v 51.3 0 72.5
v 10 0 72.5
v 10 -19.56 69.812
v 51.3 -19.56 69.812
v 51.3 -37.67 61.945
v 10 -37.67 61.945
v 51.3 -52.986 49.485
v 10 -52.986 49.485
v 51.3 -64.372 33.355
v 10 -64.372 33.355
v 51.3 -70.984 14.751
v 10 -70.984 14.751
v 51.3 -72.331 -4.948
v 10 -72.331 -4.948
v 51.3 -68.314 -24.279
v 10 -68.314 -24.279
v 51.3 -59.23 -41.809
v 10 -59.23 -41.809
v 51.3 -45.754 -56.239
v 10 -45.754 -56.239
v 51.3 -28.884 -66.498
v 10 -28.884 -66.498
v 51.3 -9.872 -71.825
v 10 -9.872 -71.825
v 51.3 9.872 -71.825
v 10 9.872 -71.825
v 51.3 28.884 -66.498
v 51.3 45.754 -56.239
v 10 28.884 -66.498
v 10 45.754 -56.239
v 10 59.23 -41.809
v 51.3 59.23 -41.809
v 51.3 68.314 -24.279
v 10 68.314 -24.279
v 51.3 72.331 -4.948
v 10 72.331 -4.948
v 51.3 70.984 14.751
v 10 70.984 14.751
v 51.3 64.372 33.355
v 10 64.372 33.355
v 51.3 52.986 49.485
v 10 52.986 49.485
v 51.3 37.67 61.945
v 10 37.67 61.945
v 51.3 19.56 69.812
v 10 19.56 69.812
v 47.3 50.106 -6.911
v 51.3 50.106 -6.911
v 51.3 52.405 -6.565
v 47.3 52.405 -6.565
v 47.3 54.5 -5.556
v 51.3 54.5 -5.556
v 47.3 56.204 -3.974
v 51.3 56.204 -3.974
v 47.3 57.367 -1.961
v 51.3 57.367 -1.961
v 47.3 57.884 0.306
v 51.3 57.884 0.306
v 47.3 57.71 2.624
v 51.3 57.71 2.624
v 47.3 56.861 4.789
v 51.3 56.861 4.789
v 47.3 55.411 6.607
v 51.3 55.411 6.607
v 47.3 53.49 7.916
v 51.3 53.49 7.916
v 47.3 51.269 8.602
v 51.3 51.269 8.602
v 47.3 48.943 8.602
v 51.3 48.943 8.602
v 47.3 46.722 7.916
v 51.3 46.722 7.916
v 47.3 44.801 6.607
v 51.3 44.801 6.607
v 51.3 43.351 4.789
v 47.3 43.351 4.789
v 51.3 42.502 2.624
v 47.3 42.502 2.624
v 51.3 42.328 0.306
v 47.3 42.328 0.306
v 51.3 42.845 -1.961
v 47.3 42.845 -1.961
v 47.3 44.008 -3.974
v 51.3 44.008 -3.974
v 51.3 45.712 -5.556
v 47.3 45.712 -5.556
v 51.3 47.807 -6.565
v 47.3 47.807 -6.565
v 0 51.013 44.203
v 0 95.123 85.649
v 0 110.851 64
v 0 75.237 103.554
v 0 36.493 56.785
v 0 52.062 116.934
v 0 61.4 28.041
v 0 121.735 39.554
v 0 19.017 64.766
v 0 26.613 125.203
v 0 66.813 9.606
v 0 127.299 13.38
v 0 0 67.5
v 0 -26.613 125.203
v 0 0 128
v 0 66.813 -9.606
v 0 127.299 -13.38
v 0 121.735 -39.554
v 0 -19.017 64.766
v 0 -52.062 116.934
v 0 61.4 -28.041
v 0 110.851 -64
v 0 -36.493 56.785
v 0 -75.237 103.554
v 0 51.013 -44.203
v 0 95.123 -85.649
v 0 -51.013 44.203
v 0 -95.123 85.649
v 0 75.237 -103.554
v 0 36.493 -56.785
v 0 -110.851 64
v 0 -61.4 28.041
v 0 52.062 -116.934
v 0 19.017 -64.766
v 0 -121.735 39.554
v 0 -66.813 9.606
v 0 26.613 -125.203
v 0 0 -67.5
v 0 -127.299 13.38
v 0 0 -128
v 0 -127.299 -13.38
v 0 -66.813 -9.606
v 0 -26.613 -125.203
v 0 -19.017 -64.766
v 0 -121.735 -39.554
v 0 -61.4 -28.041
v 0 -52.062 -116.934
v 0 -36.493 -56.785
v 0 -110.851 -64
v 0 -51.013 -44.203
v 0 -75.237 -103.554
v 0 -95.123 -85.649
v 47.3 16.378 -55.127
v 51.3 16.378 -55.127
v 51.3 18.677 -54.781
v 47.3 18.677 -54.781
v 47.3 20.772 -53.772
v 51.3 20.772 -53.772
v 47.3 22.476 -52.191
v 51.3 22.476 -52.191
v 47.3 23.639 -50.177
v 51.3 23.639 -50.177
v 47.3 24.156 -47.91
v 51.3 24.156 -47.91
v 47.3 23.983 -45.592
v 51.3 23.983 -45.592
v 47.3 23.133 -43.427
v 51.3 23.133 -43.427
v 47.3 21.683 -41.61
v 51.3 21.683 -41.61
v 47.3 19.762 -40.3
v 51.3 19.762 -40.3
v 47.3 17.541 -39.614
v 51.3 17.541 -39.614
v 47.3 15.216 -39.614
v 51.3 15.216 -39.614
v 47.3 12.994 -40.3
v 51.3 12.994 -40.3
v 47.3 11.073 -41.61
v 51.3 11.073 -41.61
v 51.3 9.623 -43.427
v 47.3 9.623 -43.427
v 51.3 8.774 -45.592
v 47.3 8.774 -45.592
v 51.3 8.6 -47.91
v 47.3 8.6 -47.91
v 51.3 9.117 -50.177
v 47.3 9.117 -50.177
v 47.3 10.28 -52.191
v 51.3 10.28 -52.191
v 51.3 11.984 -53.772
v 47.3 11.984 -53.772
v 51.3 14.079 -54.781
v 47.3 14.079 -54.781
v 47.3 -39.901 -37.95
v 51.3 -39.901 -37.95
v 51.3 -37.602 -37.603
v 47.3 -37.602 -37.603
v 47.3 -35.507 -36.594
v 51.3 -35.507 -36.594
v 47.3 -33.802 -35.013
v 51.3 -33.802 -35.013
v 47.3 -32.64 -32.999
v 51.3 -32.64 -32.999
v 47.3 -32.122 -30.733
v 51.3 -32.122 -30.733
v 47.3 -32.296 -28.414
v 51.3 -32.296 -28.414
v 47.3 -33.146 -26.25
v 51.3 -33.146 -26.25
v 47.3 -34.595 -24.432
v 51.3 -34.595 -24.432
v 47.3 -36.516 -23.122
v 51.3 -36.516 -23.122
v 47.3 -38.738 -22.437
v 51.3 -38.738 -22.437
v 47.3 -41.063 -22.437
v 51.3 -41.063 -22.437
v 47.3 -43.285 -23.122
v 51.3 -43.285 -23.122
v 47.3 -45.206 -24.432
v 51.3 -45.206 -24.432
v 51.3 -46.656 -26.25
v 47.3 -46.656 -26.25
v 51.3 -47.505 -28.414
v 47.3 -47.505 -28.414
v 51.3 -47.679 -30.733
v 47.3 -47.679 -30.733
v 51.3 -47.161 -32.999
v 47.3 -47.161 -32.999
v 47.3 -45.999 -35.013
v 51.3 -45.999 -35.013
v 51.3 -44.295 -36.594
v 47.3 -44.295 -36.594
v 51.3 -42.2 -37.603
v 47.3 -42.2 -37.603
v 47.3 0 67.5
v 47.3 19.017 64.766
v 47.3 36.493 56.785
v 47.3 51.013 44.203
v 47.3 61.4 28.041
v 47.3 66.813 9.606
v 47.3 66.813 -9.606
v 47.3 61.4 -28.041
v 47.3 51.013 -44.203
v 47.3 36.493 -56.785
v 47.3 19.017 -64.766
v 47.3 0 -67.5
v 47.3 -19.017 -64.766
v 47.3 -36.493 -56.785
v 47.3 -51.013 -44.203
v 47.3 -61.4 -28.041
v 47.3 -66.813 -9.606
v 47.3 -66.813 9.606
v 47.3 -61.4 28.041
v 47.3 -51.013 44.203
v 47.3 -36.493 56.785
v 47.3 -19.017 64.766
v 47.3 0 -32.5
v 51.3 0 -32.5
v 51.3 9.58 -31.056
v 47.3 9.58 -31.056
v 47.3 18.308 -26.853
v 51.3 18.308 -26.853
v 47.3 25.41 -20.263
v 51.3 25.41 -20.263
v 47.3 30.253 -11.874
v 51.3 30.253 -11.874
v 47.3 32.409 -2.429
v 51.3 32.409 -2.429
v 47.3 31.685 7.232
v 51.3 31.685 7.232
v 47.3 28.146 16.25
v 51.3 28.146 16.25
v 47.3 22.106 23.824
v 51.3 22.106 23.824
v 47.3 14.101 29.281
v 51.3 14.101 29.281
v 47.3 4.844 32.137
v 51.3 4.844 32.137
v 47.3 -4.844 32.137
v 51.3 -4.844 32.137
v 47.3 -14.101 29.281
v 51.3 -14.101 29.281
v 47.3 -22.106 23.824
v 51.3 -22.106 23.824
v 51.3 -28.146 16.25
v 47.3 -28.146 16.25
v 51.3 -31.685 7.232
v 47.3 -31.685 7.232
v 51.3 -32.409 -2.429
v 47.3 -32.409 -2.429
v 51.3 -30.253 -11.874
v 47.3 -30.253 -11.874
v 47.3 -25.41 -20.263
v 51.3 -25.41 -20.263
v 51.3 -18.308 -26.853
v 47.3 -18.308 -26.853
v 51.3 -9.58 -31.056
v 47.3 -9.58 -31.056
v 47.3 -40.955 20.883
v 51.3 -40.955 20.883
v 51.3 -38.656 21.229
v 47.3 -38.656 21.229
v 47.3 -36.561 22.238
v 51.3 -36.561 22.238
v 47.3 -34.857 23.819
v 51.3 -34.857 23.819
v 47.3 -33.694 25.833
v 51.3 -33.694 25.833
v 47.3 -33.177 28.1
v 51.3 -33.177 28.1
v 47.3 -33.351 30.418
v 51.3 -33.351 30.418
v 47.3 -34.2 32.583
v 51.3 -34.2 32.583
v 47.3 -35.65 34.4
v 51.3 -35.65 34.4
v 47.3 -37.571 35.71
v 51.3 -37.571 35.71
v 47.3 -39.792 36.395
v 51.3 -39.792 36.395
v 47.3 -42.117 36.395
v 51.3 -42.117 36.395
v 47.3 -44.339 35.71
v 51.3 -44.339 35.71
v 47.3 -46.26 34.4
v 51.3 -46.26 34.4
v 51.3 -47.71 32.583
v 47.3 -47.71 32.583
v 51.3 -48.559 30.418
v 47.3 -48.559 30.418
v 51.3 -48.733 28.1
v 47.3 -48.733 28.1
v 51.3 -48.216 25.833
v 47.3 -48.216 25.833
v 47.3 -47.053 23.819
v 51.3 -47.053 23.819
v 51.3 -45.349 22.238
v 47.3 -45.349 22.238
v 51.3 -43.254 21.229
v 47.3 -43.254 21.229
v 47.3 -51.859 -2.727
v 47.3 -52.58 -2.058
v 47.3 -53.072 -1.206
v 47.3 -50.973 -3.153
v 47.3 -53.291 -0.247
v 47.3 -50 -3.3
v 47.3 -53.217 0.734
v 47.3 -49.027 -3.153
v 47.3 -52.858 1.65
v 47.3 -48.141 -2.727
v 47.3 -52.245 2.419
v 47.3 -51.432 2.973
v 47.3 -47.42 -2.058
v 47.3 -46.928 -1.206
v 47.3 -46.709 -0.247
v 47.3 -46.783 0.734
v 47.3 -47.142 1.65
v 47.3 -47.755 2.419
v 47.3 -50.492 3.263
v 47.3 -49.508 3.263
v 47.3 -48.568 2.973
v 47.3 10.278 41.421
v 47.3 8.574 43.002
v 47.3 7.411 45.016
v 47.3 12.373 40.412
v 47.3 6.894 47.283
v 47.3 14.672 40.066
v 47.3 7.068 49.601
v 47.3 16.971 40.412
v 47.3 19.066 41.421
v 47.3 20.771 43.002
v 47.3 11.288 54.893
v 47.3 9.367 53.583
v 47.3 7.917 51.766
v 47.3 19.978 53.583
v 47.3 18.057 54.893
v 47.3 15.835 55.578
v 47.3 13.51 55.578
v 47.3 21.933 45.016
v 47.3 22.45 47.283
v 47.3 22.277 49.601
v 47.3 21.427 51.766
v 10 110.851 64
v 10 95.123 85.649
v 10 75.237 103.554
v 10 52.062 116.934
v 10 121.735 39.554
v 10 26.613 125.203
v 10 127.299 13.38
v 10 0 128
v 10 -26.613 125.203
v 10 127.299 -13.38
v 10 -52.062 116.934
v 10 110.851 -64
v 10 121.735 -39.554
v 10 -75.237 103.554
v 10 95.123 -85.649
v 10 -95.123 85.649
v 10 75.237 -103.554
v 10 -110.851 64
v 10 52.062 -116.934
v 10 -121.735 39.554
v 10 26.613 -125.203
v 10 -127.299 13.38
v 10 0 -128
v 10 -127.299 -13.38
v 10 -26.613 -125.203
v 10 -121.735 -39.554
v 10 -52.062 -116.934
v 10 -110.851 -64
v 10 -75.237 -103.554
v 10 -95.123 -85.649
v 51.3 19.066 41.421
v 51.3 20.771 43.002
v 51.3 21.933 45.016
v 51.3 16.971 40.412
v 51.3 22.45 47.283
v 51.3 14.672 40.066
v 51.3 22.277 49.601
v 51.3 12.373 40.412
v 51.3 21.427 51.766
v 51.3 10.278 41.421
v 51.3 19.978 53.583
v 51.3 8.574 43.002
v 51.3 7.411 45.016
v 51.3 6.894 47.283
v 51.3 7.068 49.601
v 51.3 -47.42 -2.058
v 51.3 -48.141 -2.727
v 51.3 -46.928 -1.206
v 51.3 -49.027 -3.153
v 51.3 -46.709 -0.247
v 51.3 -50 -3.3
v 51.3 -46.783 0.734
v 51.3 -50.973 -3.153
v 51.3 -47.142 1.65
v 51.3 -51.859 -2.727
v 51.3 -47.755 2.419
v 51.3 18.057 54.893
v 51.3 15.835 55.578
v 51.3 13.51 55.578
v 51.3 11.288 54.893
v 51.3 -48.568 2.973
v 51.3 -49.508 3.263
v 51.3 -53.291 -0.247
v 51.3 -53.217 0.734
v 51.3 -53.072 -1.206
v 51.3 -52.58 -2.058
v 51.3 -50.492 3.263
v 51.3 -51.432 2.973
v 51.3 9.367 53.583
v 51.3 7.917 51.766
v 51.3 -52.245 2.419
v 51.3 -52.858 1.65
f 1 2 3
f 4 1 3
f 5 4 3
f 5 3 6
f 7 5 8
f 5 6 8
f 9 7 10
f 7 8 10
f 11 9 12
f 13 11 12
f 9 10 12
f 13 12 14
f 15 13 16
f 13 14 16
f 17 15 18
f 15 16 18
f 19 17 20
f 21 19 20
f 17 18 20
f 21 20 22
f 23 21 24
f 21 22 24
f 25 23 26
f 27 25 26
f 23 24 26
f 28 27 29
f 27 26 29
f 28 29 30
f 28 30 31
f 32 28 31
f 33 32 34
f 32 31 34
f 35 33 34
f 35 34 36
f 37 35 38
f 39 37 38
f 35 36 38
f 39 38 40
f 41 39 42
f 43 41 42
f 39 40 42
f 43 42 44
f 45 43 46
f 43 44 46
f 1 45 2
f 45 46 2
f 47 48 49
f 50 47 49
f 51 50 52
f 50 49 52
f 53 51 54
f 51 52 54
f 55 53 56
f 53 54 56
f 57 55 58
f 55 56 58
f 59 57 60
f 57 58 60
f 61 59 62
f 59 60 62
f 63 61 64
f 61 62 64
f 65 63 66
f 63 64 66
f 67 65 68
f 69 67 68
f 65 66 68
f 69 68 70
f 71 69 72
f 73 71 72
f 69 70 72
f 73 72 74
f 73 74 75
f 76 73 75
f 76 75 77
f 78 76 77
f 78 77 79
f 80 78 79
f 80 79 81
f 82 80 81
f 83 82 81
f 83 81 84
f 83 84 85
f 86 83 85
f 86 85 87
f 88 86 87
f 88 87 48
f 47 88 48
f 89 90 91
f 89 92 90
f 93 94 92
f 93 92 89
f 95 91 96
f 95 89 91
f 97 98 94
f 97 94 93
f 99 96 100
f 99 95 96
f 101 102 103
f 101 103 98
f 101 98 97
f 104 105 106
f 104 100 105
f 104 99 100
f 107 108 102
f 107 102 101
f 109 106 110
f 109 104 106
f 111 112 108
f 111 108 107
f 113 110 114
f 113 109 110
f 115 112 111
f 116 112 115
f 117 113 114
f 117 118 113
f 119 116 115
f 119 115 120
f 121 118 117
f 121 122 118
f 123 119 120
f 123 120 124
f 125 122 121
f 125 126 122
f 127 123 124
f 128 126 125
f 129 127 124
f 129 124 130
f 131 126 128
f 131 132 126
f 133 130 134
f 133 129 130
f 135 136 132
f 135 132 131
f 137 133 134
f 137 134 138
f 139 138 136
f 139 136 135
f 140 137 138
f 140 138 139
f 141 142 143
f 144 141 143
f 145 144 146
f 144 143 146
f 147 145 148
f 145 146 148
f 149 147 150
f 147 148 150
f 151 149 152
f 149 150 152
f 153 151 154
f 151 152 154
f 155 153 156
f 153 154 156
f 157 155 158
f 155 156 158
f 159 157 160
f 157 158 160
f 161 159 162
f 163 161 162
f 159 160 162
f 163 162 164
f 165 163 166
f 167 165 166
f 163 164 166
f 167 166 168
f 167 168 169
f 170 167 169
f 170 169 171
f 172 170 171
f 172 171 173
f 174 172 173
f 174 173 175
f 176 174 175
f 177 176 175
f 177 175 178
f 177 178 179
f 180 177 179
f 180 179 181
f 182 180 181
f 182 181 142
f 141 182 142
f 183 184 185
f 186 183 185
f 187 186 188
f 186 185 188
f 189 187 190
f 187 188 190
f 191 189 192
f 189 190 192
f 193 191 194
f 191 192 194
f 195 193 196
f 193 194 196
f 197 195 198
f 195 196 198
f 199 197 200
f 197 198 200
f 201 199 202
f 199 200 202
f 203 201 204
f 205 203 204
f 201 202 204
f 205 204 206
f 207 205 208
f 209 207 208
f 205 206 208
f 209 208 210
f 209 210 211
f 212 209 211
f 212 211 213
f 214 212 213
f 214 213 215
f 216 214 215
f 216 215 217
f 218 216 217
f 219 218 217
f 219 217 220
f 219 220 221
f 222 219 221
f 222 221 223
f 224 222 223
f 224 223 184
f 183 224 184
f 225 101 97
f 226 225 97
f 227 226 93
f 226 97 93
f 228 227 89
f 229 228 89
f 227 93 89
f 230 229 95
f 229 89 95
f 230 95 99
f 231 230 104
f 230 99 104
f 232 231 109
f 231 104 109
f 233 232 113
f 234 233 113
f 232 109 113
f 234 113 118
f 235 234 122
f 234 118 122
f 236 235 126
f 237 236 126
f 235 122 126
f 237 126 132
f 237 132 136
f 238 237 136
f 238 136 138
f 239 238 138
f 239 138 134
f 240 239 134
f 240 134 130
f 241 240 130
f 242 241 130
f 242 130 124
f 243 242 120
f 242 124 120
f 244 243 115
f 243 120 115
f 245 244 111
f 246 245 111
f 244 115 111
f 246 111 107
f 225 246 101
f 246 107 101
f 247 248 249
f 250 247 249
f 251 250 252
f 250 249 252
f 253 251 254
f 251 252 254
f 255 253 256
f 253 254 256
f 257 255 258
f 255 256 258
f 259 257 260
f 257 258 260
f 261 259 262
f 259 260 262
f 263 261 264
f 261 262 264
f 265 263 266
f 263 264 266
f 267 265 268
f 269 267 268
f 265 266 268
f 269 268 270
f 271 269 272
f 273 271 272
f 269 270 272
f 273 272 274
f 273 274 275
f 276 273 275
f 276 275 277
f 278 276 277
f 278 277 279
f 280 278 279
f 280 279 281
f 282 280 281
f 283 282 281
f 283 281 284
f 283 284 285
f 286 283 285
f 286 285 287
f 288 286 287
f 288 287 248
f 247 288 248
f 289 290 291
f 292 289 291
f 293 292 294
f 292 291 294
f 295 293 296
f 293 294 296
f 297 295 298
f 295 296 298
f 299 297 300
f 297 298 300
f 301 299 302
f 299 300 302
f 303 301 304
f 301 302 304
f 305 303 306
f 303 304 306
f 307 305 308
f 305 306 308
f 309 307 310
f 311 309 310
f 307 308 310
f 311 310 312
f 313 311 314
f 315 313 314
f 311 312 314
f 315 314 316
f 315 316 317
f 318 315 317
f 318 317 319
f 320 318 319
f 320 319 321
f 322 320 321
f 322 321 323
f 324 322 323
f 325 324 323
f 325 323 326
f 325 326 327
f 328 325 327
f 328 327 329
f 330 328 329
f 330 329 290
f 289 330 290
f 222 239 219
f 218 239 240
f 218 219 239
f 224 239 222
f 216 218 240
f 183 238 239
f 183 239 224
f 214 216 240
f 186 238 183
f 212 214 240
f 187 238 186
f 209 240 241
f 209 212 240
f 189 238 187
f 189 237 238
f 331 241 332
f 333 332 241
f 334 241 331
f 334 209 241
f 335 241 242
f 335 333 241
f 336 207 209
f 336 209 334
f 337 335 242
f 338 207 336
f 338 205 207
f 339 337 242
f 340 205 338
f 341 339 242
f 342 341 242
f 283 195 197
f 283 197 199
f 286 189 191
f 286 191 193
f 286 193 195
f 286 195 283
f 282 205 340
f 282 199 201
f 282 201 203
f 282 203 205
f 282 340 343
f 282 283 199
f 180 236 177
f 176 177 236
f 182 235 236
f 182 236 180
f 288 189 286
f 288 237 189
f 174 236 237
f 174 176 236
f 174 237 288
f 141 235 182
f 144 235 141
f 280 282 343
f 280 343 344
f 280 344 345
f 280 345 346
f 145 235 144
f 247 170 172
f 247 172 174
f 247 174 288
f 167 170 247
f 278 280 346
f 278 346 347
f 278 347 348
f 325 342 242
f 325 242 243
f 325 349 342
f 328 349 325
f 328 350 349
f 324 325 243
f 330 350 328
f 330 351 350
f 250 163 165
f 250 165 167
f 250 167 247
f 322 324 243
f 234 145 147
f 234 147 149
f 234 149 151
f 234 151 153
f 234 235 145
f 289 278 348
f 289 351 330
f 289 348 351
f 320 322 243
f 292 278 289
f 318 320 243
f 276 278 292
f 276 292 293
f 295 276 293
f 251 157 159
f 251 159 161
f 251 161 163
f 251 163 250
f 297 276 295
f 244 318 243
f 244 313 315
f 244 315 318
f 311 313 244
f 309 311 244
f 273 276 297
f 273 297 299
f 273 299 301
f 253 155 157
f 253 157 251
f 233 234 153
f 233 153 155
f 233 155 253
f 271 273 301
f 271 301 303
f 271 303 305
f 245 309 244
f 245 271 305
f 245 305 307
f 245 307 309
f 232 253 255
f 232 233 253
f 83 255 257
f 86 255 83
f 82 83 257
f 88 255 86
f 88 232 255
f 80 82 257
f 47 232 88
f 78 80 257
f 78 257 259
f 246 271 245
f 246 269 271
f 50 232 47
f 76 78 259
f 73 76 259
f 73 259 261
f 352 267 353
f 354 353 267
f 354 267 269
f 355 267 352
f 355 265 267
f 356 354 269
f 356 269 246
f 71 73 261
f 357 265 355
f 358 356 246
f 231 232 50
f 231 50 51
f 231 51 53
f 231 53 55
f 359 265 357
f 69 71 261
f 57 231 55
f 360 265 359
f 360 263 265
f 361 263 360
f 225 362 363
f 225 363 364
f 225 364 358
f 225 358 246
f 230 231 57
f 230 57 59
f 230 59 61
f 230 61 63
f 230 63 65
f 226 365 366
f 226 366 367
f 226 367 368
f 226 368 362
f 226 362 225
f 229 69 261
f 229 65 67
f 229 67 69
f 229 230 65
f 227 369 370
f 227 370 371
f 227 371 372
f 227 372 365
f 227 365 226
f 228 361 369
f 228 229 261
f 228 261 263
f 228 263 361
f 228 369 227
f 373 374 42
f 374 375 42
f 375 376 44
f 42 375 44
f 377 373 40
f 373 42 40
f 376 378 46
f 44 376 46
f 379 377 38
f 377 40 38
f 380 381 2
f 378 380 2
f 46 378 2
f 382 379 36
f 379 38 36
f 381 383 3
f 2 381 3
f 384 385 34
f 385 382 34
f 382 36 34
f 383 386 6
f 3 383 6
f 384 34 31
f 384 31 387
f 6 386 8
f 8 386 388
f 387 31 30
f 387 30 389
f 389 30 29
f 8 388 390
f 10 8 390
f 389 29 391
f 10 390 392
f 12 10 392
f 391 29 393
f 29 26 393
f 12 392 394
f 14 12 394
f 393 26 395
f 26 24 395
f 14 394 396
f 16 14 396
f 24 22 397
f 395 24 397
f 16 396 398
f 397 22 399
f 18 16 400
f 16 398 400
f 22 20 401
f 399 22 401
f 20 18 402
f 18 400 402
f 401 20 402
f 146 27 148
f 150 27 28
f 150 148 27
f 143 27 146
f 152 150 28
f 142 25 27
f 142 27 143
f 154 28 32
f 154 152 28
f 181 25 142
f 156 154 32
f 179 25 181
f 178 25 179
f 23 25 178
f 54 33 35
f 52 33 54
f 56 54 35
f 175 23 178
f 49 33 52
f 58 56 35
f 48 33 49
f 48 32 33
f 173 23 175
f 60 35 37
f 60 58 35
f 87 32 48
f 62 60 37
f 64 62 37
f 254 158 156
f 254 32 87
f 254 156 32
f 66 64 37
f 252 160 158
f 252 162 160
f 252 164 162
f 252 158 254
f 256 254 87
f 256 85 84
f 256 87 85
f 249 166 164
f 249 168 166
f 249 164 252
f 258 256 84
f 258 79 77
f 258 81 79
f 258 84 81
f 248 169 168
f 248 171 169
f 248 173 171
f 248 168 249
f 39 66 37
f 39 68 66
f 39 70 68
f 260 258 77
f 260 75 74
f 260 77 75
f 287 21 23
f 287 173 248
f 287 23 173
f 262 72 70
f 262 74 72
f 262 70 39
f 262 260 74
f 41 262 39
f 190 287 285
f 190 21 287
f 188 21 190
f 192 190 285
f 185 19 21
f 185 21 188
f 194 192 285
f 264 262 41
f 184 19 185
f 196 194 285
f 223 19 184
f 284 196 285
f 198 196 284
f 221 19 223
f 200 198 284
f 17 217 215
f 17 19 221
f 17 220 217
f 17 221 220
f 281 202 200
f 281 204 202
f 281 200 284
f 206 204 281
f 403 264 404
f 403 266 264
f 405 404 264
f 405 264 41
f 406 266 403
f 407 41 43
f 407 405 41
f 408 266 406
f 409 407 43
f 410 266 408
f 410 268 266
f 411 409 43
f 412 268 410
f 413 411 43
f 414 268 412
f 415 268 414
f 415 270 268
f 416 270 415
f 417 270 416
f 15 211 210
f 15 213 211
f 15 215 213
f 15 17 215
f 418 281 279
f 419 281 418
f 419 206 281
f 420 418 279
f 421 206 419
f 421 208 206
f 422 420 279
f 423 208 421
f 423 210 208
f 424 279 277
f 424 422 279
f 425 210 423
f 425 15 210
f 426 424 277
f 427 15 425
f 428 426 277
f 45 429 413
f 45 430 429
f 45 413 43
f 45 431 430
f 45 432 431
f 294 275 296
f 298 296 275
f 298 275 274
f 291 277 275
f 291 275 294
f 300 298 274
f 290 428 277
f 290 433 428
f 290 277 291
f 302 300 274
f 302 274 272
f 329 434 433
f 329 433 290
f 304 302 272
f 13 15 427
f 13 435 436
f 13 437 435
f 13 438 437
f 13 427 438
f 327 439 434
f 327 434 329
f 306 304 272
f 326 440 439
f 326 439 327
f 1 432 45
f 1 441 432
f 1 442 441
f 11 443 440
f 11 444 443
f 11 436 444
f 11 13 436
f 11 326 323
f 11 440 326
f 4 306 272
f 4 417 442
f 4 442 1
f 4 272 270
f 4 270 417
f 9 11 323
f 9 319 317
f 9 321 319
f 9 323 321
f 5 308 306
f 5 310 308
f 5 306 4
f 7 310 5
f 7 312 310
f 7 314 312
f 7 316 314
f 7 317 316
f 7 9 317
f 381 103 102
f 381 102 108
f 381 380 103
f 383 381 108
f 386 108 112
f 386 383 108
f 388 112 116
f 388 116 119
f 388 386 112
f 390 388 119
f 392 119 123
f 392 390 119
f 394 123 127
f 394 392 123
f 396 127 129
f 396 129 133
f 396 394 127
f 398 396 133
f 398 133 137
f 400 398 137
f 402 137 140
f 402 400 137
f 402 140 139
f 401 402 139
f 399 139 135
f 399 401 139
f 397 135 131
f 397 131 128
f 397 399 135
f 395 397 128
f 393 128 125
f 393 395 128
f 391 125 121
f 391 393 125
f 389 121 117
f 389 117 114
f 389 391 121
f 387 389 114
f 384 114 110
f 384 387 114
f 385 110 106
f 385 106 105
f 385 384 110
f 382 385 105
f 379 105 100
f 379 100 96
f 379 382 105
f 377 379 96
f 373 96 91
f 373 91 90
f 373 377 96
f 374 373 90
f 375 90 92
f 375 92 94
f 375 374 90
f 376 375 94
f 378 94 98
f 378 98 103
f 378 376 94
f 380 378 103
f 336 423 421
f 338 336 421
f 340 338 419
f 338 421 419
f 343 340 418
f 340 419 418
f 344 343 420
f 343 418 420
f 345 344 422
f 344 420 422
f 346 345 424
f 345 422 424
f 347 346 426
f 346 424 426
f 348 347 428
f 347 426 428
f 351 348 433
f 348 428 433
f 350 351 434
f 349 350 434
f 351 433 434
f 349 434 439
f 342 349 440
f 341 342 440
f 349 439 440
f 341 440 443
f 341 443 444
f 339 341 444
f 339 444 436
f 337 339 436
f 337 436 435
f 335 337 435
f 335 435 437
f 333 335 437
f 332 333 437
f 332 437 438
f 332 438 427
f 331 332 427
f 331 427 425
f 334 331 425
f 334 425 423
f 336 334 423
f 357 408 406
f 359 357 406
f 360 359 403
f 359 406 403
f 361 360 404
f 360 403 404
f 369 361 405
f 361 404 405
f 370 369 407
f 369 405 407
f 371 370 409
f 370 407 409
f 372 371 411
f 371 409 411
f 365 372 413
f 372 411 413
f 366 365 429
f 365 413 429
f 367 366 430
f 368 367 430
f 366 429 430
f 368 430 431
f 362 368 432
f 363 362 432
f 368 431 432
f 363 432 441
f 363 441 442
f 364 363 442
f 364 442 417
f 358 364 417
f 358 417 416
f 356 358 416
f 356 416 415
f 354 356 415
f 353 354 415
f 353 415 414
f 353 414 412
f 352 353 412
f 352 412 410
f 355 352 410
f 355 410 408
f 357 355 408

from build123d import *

# Parameters (mm, degrees)
SZKIC1_W                    = 10
SZKIC1_H                    = 128
SZKIC7_R                    = 72.5
DODANIE_WYCI_GNI_CIE1_DEPTH = 41.3
SZKIC8_R                    = 67.5
WYTNIJ_WYCI_GNI_CIE7_DEPTH  = 47.3
WYTNIJ_WYCI_GNI_CIE8_REACH  = 190.148
SZKIC9_R                    = 32.5
WYTNIJ_WYCI_GNI_CIE9_REACH  = 190.148
SZKIC10_R                   = 3.3
SZKIC10_R_2                 = 7.8


with BuildPart() as part:
    # Szkic1 → Obrót1 (revolve)
    with BuildSketch(Plane(origin=(0, 0, 0), x_dir=(1, 0, 0), z_dir=(0, 1, 0)), mode=Mode.PRIVATE) as obr_t1_sk:
        with Locations((5, 64)):
            Rectangle(SZKIC1_W, SZKIC1_H)
    revolve(obr_t1_sk.sketch.rotate(Axis((0, 0, 0), (1, 0, 0)), 180), axis=Axis((0, 0, 0), (1, 0, 0)))

    # Szkic7 → Dodanie-wyciągnięcie1 (add)
    with BuildSketch(Plane(origin=(10, 0, 0), x_dir=(0, 0, -1), z_dir=(1, 0, 0))):
        with Locations(Location((0, 0, 0), (0, 0, 180))):
            Circle(SZKIC7_R)
    extrude(amount=DODANIE_WYCI_GNI_CIE1_DEPTH)

    # Szkic8 → Wytnij-wyciągnięcie7 (cut)
    with BuildSketch(Plane.ZY):
        Circle(SZKIC8_R)
    extrude(amount=-WYTNIJ_WYCI_GNI_CIE7_DEPTH, mode=Mode.SUBTRACT)

    # Szkic9 → Wytnij-wyciągnięcie8 (cut, up to next)
    with BuildSketch(Plane(origin=(51.3, 0, 0), x_dir=(0, 0, -1), z_dir=(1, 0, 0)), mode=Mode.PRIVATE) as wytnij_wyci_gni_cie8_sk1:
        Circle(SZKIC9_R)
    wytnij_wyci_gni_cie8_tool1 = extrude(wytnij_wyci_gni_cie8_sk1.sketch, amount=-WYTNIJ_WYCI_GNI_CIE8_REACH, mode=Mode.PRIVATE) & part.part
    add(wytnij_wyci_gni_cie8_tool1.solids().sort_by_distance((51.3, 0, 0))[0], mode=Mode.SUBTRACT)

    # Szkic10 → Wytnij-wyciągnięcie9 (cut, up to next)
    with BuildSketch(Plane(origin=(51.3, 0, 0), x_dir=(0, 0, -1), z_dir=(1, 0, 0)), mode=Mode.PRIVATE) as wytnij_wyci_gni_cie9_sk1:
        with Locations((0, -50)):
            Circle(SZKIC10_R)
    wytnij_wyci_gni_cie9_tool1 = extrude(wytnij_wyci_gni_cie9_sk1.sketch, amount=-WYTNIJ_WYCI_GNI_CIE9_REACH, mode=Mode.PRIVATE) & part.part
    # Szkic10 → Wytnij-wyciągnięcie9 (cut, up to next)
    with BuildSketch(Plane(origin=(51.3, 0, 0), x_dir=(0, 0, -1), z_dir=(1, 0, 0)), mode=Mode.PRIVATE) as wytnij_wyci_gni_cie9_sk2:
        with Locations((-28.682618124, -40.95494375)):
            Circle(SZKIC10_R_2)
    wytnij_wyci_gni_cie9_tool2 = extrude(wytnij_wyci_gni_cie9_sk2.sketch, amount=-WYTNIJ_WYCI_GNI_CIE9_REACH, mode=Mode.PRIVATE) & part.part
    # Szkic10 → Wytnij-wyciągnięcie9 (cut, up to next)
    with BuildSketch(Plane(origin=(51.3, 0, 0), x_dir=(0, 0, -1), z_dir=(1, 0, 0)), mode=Mode.PRIVATE) as wytnij_wyci_gni_cie9_sk3:
        with Locations((-47.865538925, 14.672227833)):
            Circle(SZKIC10_R_2)
    wytnij_wyci_gni_cie9_tool3 = extrude(wytnij_wyci_gni_cie9_sk3.sketch, amount=-WYTNIJ_WYCI_GNI_CIE9_REACH, mode=Mode.PRIVATE) & part.part
    # Szkic10 → Wytnij-wyciągnięcie9 (cut, up to next)
    with BuildSketch(Plane(origin=(51.3, 0, 0), x_dir=(0, 0, -1), z_dir=(1, 0, 0)), mode=Mode.PRIVATE) as wytnij_wyci_gni_cie9_sk4:
        with Locations((-0.888803437, 50.106011031)):
            Circle(SZKIC10_R_2)
    wytnij_wyci_gni_cie9_tool4 = extrude(wytnij_wyci_gni_cie9_sk4.sketch, amount=-WYTNIJ_WYCI_GNI_CIE9_REACH, mode=Mode.PRIVATE) & part.part
    # Szkic10 → Wytnij-wyciągnięcie9 (cut, up to next)
    with BuildSketch(Plane(origin=(51.3, 0, 0), x_dir=(0, 0, -1), z_dir=(1, 0, 0)), mode=Mode.PRIVATE) as wytnij_wyci_gni_cie9_sk5:
        with Locations((47.327336576, 16.378121814)):
            Circle(SZKIC10_R_2)
    wytnij_wyci_gni_cie9_tool5 = extrude(wytnij_wyci_gni_cie9_sk5.sketch, amount=-WYTNIJ_WYCI_GNI_CIE9_REACH, mode=Mode.PRIVATE) & part.part
    # Szkic10 → Wytnij-wyciągnięcie9 (cut, up to next)
    with BuildSketch(Plane(origin=(51.3, 0, 0), x_dir=(0, 0, -1), z_dir=(1, 0, 0)), mode=Mode.PRIVATE) as wytnij_wyci_gni_cie9_sk6:
        with Locations((30.149814423, -39.900643288)):
            Circle(SZKIC10_R_2)
    wytnij_wyci_gni_cie9_tool6 = extrude(wytnij_wyci_gni_cie9_sk6.sketch, amount=-WYTNIJ_WYCI_GNI_CIE9_REACH, mode=Mode.PRIVATE) & part.part
    add(wytnij_wyci_gni_cie9_tool1.solids().sort_by_distance((51.3, -50, 0))[0], mode=Mode.SUBTRACT)
    add(wytnij_wyci_gni_cie9_tool2.solids().sort_by_distance((51.3, -40.954944, 28.682618))[0], mode=Mode.SUBTRACT)
    add(wytnij_wyci_gni_cie9_tool3.solids().sort_by_distance((51.3, 14.672228, 47.865539))[0], mode=Mode.SUBTRACT)
    add(wytnij_wyci_gni_cie9_tool4.solids().sort_by_distance((51.3, 50.106011, 0.888803))[0], mode=Mode.SUBTRACT)
    add(wytnij_wyci_gni_cie9_tool5.solids().sort_by_distance((51.3, 16.378122, -47.327337))[0], mode=Mode.SUBTRACT)
    add(wytnij_wyci_gni_cie9_tool6.solids().sort_by_distance((51.3, -39.900643, -30.149814))[0], mode=Mode.SUBTRACT)


solid = part.part
